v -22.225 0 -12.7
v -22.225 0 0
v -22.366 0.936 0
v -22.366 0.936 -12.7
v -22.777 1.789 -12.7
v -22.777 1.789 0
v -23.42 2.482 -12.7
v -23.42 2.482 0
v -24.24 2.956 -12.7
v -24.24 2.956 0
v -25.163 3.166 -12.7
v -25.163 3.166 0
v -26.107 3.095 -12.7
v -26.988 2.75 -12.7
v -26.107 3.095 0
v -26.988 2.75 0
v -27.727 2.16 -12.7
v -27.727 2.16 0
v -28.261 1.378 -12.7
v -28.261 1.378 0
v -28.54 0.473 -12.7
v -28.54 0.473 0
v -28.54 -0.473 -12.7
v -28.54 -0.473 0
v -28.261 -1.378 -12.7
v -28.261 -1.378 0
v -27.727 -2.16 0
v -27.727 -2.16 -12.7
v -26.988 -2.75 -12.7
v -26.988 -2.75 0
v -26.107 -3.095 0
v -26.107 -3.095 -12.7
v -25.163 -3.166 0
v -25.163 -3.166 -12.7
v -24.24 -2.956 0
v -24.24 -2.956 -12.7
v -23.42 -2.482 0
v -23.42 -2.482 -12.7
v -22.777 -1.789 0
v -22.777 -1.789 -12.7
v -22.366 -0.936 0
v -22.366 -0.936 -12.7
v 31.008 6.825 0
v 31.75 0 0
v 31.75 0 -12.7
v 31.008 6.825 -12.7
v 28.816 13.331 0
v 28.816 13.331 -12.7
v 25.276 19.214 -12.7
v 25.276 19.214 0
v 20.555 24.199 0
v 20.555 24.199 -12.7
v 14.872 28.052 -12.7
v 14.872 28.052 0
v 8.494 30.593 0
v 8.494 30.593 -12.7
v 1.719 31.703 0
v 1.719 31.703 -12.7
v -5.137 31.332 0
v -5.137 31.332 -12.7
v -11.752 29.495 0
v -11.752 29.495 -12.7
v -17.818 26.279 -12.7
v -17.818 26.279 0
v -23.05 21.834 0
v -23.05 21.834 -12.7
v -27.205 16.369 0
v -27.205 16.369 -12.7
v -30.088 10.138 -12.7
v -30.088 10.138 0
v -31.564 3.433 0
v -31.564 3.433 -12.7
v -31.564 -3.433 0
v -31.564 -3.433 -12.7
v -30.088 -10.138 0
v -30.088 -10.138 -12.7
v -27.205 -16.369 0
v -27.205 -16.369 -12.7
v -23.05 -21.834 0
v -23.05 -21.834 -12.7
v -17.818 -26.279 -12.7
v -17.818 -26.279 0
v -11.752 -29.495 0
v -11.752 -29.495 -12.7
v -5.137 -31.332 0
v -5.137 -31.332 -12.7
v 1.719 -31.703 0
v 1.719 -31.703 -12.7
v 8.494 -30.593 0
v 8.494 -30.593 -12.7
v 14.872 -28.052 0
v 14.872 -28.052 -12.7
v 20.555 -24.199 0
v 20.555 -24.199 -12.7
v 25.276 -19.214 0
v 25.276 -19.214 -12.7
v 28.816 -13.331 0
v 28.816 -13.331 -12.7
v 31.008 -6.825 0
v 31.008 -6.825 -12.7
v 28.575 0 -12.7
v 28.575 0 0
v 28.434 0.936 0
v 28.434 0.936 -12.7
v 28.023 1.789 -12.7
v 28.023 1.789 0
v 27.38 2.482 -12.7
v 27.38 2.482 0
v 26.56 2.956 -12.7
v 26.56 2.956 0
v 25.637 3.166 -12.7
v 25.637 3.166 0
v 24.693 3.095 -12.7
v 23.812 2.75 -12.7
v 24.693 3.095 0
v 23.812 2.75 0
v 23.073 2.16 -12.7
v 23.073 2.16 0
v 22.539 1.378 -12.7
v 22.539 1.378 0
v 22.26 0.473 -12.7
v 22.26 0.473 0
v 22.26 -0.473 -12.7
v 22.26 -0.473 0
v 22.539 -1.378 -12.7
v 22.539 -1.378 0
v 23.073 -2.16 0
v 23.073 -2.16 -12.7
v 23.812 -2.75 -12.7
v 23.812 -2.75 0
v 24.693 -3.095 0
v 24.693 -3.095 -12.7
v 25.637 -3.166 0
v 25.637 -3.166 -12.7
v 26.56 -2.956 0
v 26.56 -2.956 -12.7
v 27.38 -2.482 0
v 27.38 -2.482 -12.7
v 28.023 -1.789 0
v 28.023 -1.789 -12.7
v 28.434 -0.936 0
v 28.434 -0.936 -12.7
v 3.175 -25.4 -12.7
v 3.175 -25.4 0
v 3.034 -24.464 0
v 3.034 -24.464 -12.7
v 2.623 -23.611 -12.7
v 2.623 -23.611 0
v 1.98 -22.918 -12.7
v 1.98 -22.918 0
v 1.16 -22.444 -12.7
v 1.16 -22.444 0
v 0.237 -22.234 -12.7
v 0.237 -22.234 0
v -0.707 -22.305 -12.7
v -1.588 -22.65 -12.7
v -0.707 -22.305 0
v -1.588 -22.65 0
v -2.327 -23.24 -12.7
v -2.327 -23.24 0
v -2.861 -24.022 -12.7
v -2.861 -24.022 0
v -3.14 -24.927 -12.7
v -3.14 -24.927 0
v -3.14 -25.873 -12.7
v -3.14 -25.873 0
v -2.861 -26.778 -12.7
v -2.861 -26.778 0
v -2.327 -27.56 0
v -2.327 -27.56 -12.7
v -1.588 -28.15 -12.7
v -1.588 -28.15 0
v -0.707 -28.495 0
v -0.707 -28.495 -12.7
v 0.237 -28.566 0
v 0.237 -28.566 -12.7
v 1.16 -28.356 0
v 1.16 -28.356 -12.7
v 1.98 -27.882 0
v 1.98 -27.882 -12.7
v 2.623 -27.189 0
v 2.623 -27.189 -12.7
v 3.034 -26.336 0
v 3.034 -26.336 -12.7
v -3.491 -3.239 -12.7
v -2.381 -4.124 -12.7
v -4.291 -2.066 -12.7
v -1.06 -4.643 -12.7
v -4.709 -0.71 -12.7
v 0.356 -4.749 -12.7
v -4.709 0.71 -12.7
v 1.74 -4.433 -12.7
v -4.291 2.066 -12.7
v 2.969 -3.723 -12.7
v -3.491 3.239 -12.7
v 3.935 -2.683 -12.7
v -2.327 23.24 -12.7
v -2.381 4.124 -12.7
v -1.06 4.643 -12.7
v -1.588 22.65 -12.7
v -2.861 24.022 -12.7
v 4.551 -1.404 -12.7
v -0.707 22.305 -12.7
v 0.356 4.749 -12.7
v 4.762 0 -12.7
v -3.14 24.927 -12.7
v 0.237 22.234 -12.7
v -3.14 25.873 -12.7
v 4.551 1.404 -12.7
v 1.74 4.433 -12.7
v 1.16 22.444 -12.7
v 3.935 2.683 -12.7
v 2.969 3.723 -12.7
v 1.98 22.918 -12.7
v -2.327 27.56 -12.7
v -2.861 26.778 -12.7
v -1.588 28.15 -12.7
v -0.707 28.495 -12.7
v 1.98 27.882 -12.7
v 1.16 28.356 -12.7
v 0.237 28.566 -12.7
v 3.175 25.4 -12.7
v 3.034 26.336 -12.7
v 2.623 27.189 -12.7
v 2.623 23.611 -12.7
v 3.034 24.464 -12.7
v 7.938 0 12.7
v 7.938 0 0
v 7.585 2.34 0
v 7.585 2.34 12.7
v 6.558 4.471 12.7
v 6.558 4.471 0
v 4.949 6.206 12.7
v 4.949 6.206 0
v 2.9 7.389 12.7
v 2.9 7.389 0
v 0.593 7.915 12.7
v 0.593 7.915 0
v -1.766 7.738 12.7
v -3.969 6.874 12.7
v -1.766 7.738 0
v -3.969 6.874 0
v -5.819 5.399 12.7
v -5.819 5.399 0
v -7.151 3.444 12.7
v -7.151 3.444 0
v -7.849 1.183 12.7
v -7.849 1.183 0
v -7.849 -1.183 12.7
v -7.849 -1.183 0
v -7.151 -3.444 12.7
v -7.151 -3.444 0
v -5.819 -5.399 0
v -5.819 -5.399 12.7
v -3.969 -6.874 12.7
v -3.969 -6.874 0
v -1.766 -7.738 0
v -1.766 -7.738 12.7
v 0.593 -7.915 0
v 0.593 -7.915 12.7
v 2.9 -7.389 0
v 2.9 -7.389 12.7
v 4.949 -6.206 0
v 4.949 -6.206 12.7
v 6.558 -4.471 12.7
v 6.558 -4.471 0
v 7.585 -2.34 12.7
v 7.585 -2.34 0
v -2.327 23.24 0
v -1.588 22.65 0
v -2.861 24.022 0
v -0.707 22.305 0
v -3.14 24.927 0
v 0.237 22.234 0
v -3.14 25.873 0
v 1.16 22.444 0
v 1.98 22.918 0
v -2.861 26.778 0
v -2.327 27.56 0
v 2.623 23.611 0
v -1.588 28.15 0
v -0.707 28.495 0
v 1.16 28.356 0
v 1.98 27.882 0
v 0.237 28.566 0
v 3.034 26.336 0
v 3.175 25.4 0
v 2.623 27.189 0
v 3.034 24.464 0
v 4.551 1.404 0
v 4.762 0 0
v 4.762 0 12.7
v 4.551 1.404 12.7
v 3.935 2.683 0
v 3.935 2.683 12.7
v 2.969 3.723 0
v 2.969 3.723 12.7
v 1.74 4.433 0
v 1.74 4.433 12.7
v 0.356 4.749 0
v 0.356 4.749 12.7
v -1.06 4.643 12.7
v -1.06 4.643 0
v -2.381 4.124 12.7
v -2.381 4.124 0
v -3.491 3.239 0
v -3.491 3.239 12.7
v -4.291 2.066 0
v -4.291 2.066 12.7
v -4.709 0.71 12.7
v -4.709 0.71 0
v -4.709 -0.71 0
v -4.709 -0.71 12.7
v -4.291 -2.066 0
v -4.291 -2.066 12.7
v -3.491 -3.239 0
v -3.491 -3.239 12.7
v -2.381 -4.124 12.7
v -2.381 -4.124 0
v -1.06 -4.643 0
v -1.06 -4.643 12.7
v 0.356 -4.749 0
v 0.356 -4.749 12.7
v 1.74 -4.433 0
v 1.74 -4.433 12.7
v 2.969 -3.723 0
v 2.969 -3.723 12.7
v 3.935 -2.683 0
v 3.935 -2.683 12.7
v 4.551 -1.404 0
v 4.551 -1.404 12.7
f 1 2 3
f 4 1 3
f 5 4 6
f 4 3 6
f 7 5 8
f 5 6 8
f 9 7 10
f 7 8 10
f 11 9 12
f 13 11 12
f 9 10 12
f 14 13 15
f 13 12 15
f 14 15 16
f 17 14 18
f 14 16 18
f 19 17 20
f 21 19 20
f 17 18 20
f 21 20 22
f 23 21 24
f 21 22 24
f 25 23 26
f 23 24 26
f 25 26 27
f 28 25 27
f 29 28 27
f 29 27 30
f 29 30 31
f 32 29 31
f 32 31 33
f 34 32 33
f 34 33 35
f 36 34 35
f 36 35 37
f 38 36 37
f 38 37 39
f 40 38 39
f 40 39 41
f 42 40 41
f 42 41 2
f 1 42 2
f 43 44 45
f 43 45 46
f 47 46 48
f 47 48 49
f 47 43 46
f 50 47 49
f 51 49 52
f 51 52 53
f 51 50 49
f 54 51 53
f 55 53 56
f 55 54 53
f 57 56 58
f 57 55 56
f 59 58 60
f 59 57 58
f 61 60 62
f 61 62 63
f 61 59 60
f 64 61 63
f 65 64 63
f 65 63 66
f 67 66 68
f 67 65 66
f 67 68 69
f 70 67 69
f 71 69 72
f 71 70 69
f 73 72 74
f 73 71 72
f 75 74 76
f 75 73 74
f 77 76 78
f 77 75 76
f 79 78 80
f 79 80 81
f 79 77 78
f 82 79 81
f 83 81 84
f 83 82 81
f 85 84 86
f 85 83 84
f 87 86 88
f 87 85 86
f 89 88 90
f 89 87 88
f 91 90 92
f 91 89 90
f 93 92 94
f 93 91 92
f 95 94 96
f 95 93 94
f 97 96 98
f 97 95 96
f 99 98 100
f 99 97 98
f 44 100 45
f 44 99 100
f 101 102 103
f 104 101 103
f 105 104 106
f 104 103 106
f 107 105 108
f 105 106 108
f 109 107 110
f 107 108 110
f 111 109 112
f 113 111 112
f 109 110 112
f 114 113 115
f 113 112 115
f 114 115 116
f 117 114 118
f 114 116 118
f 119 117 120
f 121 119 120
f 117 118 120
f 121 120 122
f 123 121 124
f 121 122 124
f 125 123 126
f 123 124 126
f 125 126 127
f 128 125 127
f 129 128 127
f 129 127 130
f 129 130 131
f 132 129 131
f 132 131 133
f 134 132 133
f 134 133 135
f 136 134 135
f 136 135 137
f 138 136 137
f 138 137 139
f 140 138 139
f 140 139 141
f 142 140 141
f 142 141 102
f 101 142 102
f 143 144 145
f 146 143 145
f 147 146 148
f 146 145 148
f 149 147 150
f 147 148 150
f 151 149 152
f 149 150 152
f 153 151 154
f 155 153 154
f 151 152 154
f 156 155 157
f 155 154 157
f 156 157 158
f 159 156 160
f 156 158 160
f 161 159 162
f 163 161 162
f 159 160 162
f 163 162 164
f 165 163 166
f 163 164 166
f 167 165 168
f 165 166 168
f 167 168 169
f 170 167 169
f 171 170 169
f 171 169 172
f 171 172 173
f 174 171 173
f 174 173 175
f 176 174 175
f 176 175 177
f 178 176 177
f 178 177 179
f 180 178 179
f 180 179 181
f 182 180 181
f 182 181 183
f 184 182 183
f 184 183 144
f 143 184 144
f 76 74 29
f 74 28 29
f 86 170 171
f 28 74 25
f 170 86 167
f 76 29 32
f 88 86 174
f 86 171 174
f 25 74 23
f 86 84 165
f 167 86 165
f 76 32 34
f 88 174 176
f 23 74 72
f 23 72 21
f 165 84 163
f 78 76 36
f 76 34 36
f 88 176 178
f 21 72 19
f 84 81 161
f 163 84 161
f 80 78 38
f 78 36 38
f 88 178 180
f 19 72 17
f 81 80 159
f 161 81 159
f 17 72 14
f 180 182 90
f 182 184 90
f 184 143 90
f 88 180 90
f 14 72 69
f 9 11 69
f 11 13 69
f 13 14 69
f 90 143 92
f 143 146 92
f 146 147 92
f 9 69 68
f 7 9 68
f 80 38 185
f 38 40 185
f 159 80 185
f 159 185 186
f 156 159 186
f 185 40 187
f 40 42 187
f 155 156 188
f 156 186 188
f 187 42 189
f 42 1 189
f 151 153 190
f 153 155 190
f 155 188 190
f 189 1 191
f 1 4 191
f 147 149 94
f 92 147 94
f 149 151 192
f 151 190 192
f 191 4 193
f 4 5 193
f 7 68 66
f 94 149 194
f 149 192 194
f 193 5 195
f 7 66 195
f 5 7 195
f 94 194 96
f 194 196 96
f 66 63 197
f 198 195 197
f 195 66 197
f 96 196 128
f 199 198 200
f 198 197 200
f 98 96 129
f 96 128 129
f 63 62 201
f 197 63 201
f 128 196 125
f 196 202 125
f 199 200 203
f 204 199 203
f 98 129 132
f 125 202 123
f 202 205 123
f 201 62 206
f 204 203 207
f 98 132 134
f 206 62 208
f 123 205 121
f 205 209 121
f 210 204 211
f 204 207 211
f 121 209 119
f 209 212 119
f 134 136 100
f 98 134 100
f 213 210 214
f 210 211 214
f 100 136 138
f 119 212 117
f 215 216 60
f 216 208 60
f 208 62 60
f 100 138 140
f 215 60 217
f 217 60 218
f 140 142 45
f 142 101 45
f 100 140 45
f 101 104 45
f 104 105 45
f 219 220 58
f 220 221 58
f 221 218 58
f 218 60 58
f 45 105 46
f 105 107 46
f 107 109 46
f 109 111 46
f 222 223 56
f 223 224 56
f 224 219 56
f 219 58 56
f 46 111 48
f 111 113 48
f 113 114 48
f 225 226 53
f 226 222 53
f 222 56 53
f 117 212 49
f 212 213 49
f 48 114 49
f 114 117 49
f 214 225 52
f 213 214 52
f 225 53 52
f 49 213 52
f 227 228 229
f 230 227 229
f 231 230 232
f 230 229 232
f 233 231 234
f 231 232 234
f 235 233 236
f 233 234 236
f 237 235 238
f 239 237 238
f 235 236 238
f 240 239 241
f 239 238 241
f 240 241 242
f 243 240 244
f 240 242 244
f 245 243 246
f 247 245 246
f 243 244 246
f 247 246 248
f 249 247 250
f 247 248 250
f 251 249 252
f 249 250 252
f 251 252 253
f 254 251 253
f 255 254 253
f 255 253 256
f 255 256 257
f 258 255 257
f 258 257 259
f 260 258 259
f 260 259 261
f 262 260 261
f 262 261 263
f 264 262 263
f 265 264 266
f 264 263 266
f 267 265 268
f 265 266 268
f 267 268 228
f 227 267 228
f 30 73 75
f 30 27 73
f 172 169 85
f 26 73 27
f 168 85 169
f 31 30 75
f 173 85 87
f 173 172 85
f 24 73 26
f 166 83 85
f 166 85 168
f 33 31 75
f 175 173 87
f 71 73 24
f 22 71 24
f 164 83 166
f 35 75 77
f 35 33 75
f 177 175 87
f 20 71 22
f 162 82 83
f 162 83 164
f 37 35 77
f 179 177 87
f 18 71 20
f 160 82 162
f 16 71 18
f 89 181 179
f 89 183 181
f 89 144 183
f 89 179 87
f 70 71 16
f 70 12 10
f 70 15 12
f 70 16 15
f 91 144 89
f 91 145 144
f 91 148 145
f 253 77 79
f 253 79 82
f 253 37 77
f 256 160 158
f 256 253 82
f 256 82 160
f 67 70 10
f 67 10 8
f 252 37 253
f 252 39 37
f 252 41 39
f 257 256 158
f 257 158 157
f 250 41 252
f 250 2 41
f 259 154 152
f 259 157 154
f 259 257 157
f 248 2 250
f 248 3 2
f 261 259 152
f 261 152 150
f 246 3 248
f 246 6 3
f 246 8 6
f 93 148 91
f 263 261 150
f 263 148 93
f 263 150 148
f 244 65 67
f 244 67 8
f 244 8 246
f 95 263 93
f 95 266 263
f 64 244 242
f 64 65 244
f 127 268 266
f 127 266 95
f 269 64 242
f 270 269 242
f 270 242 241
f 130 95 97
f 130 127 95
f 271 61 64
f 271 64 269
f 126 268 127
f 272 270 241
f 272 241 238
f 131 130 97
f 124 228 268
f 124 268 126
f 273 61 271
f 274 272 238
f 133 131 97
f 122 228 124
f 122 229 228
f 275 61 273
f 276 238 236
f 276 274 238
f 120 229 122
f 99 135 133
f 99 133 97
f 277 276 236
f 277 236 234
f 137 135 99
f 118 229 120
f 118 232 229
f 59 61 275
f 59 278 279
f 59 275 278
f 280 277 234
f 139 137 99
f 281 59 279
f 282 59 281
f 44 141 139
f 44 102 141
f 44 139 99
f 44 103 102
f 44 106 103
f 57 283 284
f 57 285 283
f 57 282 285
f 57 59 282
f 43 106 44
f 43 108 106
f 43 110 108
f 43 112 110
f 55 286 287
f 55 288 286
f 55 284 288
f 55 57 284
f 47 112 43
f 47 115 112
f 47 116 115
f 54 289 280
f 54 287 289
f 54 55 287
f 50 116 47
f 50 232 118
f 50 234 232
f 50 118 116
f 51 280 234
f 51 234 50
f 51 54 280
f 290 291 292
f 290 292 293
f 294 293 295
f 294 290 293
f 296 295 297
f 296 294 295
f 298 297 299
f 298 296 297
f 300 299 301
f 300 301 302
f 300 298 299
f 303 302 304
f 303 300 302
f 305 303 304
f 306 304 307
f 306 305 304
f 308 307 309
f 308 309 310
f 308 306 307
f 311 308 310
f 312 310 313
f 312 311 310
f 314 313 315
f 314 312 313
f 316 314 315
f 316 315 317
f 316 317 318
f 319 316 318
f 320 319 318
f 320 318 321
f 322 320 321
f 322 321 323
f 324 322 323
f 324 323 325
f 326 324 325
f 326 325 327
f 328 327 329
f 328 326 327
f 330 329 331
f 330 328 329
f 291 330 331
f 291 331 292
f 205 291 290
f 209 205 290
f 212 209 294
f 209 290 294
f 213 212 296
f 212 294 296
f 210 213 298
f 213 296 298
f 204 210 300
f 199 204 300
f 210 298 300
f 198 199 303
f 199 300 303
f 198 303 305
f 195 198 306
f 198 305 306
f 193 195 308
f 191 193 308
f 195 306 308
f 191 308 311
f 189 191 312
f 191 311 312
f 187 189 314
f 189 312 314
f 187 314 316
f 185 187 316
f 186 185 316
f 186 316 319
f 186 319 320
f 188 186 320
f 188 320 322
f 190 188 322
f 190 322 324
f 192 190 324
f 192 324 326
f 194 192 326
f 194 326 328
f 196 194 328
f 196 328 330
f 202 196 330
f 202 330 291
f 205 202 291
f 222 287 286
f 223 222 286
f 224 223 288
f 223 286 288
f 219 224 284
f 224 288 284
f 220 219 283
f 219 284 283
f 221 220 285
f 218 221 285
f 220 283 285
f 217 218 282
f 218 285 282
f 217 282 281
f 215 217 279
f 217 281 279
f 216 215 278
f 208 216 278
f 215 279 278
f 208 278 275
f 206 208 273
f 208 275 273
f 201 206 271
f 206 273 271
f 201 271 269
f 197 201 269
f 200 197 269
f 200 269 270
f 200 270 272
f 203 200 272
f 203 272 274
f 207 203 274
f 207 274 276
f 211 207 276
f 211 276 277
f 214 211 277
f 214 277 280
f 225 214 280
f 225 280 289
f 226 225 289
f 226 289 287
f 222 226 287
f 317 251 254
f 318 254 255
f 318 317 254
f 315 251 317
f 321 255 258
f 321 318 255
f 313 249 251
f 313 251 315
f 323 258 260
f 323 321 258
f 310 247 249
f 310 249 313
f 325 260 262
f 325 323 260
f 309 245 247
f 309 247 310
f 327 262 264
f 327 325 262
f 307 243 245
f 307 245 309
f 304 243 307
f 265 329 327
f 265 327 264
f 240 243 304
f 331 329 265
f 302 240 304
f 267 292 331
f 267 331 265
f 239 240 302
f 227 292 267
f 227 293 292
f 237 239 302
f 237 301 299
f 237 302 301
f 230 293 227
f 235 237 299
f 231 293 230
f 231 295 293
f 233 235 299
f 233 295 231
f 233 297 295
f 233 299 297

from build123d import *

# Parameters (mm, degrees)
F0_R      = 31.75
F1_DEPTH  = 12.7
F2_R      = 7.9375
F2_R_2    = 4.7625
F3_DEPTH  = 12.7
F3_FACE_R = 4.7625
F4_DEPTH  = 25.4
F5_R      = 3.175
F6_DEPTH  = 25.4


with BuildPart() as f1:
    # F0 (on Top) → F1 (new body)
    with BuildSketch(Plane.XY):
        Circle(F0_R)
    extrude(amount=-F1_DEPTH)

    # F2 (on face) → F3 (join)
    with BuildSketch(Plane.XY):
        Circle(F2_R)
        Circle(F2_R_2, mode=Mode.SUBTRACT)
    extrude(amount=F3_DEPTH)

    # F3_face (on face) → F4 (cut)
    with BuildSketch(Plane.XY):
        Circle(F3_FACE_R)
    extrude(amount=-F4_DEPTH, mode=Mode.SUBTRACT)

    # F5 (on face) → F6 (cut)
    with BuildSketch(Plane.XY):
        with Locations((-25.4, 0)):
            Circle(F5_R)
        with Locations((0, -25.4)):
            Circle(F5_R)
        with Locations((25.4, 0)):
            Circle(F5_R)
        with Locations((0, 25.4)):
            Circle(F5_R)
    extrude(amount=-F6_DEPTH, mode=Mode.SUBTRACT)


solid = f1.part
